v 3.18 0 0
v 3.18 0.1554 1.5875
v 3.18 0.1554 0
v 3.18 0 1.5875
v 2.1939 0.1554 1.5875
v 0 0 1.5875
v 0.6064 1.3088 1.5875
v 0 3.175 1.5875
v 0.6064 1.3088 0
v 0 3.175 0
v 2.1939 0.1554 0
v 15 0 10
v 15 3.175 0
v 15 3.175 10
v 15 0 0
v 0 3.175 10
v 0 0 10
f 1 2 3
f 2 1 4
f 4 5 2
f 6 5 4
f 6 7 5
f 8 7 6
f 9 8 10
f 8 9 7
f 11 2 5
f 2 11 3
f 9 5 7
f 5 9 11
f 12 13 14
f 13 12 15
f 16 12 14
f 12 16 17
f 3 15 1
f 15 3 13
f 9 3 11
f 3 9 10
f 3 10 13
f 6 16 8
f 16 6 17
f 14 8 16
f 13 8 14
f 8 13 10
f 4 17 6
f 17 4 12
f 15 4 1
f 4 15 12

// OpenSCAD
function woodThickness()=3.175;
function boxWidth()=200;
function boxDepth()=140;
function boxHeight()=140;

function topWidth()=boxWidth();
function topDepth()=boxDepth();
function topHeight()=woodThickness();

function frontWidth()=boxWidth();
function frontDepth()=woodThickness();
function frontHeight()=boxHeight();

function backWidth()=boxWidth();
function backDepth()=woodThickness();
function backHeight()=boxHeight();

function bottomWidth()=boxWidth();
function bottomDepth()=boxDepth();
function bottomHeight()=woodThickness();

function leftWidth()=woodThickness();
function leftDepth()=boxDepth();
function leftHeight()=boxHeight();

function rightWidth()=woodThickness();
function rightDepth()=boxDepth();
function rightHeight()=boxHeight();

function tabWidth()=15;
function tabDepth()=woodThickness();
function tabHeight()=10;

function pinWidth()=woodThickness();
function pinDepth()=woodThickness();
function pinHeight()=15;

module fillet(r=woodThickness(),h=woodThickness()) {
    translate([r / 2, r / 2, 0])

        difference() {
            cube([r + 0.01, r + 0.01, h], center = true);

            translate([r/2, r/2, 0])
                cylinder(r = r, h = h + 1, center = true);

        }
}

module tab(){
	difference(){
		cube([tabWidth(),tabDepth(),tabHeight()]);
		#fillet();
	}
}

module frontSide(){
	cube([frontWidth(),frontDepth(),frontHeight()]);
}

tab();
